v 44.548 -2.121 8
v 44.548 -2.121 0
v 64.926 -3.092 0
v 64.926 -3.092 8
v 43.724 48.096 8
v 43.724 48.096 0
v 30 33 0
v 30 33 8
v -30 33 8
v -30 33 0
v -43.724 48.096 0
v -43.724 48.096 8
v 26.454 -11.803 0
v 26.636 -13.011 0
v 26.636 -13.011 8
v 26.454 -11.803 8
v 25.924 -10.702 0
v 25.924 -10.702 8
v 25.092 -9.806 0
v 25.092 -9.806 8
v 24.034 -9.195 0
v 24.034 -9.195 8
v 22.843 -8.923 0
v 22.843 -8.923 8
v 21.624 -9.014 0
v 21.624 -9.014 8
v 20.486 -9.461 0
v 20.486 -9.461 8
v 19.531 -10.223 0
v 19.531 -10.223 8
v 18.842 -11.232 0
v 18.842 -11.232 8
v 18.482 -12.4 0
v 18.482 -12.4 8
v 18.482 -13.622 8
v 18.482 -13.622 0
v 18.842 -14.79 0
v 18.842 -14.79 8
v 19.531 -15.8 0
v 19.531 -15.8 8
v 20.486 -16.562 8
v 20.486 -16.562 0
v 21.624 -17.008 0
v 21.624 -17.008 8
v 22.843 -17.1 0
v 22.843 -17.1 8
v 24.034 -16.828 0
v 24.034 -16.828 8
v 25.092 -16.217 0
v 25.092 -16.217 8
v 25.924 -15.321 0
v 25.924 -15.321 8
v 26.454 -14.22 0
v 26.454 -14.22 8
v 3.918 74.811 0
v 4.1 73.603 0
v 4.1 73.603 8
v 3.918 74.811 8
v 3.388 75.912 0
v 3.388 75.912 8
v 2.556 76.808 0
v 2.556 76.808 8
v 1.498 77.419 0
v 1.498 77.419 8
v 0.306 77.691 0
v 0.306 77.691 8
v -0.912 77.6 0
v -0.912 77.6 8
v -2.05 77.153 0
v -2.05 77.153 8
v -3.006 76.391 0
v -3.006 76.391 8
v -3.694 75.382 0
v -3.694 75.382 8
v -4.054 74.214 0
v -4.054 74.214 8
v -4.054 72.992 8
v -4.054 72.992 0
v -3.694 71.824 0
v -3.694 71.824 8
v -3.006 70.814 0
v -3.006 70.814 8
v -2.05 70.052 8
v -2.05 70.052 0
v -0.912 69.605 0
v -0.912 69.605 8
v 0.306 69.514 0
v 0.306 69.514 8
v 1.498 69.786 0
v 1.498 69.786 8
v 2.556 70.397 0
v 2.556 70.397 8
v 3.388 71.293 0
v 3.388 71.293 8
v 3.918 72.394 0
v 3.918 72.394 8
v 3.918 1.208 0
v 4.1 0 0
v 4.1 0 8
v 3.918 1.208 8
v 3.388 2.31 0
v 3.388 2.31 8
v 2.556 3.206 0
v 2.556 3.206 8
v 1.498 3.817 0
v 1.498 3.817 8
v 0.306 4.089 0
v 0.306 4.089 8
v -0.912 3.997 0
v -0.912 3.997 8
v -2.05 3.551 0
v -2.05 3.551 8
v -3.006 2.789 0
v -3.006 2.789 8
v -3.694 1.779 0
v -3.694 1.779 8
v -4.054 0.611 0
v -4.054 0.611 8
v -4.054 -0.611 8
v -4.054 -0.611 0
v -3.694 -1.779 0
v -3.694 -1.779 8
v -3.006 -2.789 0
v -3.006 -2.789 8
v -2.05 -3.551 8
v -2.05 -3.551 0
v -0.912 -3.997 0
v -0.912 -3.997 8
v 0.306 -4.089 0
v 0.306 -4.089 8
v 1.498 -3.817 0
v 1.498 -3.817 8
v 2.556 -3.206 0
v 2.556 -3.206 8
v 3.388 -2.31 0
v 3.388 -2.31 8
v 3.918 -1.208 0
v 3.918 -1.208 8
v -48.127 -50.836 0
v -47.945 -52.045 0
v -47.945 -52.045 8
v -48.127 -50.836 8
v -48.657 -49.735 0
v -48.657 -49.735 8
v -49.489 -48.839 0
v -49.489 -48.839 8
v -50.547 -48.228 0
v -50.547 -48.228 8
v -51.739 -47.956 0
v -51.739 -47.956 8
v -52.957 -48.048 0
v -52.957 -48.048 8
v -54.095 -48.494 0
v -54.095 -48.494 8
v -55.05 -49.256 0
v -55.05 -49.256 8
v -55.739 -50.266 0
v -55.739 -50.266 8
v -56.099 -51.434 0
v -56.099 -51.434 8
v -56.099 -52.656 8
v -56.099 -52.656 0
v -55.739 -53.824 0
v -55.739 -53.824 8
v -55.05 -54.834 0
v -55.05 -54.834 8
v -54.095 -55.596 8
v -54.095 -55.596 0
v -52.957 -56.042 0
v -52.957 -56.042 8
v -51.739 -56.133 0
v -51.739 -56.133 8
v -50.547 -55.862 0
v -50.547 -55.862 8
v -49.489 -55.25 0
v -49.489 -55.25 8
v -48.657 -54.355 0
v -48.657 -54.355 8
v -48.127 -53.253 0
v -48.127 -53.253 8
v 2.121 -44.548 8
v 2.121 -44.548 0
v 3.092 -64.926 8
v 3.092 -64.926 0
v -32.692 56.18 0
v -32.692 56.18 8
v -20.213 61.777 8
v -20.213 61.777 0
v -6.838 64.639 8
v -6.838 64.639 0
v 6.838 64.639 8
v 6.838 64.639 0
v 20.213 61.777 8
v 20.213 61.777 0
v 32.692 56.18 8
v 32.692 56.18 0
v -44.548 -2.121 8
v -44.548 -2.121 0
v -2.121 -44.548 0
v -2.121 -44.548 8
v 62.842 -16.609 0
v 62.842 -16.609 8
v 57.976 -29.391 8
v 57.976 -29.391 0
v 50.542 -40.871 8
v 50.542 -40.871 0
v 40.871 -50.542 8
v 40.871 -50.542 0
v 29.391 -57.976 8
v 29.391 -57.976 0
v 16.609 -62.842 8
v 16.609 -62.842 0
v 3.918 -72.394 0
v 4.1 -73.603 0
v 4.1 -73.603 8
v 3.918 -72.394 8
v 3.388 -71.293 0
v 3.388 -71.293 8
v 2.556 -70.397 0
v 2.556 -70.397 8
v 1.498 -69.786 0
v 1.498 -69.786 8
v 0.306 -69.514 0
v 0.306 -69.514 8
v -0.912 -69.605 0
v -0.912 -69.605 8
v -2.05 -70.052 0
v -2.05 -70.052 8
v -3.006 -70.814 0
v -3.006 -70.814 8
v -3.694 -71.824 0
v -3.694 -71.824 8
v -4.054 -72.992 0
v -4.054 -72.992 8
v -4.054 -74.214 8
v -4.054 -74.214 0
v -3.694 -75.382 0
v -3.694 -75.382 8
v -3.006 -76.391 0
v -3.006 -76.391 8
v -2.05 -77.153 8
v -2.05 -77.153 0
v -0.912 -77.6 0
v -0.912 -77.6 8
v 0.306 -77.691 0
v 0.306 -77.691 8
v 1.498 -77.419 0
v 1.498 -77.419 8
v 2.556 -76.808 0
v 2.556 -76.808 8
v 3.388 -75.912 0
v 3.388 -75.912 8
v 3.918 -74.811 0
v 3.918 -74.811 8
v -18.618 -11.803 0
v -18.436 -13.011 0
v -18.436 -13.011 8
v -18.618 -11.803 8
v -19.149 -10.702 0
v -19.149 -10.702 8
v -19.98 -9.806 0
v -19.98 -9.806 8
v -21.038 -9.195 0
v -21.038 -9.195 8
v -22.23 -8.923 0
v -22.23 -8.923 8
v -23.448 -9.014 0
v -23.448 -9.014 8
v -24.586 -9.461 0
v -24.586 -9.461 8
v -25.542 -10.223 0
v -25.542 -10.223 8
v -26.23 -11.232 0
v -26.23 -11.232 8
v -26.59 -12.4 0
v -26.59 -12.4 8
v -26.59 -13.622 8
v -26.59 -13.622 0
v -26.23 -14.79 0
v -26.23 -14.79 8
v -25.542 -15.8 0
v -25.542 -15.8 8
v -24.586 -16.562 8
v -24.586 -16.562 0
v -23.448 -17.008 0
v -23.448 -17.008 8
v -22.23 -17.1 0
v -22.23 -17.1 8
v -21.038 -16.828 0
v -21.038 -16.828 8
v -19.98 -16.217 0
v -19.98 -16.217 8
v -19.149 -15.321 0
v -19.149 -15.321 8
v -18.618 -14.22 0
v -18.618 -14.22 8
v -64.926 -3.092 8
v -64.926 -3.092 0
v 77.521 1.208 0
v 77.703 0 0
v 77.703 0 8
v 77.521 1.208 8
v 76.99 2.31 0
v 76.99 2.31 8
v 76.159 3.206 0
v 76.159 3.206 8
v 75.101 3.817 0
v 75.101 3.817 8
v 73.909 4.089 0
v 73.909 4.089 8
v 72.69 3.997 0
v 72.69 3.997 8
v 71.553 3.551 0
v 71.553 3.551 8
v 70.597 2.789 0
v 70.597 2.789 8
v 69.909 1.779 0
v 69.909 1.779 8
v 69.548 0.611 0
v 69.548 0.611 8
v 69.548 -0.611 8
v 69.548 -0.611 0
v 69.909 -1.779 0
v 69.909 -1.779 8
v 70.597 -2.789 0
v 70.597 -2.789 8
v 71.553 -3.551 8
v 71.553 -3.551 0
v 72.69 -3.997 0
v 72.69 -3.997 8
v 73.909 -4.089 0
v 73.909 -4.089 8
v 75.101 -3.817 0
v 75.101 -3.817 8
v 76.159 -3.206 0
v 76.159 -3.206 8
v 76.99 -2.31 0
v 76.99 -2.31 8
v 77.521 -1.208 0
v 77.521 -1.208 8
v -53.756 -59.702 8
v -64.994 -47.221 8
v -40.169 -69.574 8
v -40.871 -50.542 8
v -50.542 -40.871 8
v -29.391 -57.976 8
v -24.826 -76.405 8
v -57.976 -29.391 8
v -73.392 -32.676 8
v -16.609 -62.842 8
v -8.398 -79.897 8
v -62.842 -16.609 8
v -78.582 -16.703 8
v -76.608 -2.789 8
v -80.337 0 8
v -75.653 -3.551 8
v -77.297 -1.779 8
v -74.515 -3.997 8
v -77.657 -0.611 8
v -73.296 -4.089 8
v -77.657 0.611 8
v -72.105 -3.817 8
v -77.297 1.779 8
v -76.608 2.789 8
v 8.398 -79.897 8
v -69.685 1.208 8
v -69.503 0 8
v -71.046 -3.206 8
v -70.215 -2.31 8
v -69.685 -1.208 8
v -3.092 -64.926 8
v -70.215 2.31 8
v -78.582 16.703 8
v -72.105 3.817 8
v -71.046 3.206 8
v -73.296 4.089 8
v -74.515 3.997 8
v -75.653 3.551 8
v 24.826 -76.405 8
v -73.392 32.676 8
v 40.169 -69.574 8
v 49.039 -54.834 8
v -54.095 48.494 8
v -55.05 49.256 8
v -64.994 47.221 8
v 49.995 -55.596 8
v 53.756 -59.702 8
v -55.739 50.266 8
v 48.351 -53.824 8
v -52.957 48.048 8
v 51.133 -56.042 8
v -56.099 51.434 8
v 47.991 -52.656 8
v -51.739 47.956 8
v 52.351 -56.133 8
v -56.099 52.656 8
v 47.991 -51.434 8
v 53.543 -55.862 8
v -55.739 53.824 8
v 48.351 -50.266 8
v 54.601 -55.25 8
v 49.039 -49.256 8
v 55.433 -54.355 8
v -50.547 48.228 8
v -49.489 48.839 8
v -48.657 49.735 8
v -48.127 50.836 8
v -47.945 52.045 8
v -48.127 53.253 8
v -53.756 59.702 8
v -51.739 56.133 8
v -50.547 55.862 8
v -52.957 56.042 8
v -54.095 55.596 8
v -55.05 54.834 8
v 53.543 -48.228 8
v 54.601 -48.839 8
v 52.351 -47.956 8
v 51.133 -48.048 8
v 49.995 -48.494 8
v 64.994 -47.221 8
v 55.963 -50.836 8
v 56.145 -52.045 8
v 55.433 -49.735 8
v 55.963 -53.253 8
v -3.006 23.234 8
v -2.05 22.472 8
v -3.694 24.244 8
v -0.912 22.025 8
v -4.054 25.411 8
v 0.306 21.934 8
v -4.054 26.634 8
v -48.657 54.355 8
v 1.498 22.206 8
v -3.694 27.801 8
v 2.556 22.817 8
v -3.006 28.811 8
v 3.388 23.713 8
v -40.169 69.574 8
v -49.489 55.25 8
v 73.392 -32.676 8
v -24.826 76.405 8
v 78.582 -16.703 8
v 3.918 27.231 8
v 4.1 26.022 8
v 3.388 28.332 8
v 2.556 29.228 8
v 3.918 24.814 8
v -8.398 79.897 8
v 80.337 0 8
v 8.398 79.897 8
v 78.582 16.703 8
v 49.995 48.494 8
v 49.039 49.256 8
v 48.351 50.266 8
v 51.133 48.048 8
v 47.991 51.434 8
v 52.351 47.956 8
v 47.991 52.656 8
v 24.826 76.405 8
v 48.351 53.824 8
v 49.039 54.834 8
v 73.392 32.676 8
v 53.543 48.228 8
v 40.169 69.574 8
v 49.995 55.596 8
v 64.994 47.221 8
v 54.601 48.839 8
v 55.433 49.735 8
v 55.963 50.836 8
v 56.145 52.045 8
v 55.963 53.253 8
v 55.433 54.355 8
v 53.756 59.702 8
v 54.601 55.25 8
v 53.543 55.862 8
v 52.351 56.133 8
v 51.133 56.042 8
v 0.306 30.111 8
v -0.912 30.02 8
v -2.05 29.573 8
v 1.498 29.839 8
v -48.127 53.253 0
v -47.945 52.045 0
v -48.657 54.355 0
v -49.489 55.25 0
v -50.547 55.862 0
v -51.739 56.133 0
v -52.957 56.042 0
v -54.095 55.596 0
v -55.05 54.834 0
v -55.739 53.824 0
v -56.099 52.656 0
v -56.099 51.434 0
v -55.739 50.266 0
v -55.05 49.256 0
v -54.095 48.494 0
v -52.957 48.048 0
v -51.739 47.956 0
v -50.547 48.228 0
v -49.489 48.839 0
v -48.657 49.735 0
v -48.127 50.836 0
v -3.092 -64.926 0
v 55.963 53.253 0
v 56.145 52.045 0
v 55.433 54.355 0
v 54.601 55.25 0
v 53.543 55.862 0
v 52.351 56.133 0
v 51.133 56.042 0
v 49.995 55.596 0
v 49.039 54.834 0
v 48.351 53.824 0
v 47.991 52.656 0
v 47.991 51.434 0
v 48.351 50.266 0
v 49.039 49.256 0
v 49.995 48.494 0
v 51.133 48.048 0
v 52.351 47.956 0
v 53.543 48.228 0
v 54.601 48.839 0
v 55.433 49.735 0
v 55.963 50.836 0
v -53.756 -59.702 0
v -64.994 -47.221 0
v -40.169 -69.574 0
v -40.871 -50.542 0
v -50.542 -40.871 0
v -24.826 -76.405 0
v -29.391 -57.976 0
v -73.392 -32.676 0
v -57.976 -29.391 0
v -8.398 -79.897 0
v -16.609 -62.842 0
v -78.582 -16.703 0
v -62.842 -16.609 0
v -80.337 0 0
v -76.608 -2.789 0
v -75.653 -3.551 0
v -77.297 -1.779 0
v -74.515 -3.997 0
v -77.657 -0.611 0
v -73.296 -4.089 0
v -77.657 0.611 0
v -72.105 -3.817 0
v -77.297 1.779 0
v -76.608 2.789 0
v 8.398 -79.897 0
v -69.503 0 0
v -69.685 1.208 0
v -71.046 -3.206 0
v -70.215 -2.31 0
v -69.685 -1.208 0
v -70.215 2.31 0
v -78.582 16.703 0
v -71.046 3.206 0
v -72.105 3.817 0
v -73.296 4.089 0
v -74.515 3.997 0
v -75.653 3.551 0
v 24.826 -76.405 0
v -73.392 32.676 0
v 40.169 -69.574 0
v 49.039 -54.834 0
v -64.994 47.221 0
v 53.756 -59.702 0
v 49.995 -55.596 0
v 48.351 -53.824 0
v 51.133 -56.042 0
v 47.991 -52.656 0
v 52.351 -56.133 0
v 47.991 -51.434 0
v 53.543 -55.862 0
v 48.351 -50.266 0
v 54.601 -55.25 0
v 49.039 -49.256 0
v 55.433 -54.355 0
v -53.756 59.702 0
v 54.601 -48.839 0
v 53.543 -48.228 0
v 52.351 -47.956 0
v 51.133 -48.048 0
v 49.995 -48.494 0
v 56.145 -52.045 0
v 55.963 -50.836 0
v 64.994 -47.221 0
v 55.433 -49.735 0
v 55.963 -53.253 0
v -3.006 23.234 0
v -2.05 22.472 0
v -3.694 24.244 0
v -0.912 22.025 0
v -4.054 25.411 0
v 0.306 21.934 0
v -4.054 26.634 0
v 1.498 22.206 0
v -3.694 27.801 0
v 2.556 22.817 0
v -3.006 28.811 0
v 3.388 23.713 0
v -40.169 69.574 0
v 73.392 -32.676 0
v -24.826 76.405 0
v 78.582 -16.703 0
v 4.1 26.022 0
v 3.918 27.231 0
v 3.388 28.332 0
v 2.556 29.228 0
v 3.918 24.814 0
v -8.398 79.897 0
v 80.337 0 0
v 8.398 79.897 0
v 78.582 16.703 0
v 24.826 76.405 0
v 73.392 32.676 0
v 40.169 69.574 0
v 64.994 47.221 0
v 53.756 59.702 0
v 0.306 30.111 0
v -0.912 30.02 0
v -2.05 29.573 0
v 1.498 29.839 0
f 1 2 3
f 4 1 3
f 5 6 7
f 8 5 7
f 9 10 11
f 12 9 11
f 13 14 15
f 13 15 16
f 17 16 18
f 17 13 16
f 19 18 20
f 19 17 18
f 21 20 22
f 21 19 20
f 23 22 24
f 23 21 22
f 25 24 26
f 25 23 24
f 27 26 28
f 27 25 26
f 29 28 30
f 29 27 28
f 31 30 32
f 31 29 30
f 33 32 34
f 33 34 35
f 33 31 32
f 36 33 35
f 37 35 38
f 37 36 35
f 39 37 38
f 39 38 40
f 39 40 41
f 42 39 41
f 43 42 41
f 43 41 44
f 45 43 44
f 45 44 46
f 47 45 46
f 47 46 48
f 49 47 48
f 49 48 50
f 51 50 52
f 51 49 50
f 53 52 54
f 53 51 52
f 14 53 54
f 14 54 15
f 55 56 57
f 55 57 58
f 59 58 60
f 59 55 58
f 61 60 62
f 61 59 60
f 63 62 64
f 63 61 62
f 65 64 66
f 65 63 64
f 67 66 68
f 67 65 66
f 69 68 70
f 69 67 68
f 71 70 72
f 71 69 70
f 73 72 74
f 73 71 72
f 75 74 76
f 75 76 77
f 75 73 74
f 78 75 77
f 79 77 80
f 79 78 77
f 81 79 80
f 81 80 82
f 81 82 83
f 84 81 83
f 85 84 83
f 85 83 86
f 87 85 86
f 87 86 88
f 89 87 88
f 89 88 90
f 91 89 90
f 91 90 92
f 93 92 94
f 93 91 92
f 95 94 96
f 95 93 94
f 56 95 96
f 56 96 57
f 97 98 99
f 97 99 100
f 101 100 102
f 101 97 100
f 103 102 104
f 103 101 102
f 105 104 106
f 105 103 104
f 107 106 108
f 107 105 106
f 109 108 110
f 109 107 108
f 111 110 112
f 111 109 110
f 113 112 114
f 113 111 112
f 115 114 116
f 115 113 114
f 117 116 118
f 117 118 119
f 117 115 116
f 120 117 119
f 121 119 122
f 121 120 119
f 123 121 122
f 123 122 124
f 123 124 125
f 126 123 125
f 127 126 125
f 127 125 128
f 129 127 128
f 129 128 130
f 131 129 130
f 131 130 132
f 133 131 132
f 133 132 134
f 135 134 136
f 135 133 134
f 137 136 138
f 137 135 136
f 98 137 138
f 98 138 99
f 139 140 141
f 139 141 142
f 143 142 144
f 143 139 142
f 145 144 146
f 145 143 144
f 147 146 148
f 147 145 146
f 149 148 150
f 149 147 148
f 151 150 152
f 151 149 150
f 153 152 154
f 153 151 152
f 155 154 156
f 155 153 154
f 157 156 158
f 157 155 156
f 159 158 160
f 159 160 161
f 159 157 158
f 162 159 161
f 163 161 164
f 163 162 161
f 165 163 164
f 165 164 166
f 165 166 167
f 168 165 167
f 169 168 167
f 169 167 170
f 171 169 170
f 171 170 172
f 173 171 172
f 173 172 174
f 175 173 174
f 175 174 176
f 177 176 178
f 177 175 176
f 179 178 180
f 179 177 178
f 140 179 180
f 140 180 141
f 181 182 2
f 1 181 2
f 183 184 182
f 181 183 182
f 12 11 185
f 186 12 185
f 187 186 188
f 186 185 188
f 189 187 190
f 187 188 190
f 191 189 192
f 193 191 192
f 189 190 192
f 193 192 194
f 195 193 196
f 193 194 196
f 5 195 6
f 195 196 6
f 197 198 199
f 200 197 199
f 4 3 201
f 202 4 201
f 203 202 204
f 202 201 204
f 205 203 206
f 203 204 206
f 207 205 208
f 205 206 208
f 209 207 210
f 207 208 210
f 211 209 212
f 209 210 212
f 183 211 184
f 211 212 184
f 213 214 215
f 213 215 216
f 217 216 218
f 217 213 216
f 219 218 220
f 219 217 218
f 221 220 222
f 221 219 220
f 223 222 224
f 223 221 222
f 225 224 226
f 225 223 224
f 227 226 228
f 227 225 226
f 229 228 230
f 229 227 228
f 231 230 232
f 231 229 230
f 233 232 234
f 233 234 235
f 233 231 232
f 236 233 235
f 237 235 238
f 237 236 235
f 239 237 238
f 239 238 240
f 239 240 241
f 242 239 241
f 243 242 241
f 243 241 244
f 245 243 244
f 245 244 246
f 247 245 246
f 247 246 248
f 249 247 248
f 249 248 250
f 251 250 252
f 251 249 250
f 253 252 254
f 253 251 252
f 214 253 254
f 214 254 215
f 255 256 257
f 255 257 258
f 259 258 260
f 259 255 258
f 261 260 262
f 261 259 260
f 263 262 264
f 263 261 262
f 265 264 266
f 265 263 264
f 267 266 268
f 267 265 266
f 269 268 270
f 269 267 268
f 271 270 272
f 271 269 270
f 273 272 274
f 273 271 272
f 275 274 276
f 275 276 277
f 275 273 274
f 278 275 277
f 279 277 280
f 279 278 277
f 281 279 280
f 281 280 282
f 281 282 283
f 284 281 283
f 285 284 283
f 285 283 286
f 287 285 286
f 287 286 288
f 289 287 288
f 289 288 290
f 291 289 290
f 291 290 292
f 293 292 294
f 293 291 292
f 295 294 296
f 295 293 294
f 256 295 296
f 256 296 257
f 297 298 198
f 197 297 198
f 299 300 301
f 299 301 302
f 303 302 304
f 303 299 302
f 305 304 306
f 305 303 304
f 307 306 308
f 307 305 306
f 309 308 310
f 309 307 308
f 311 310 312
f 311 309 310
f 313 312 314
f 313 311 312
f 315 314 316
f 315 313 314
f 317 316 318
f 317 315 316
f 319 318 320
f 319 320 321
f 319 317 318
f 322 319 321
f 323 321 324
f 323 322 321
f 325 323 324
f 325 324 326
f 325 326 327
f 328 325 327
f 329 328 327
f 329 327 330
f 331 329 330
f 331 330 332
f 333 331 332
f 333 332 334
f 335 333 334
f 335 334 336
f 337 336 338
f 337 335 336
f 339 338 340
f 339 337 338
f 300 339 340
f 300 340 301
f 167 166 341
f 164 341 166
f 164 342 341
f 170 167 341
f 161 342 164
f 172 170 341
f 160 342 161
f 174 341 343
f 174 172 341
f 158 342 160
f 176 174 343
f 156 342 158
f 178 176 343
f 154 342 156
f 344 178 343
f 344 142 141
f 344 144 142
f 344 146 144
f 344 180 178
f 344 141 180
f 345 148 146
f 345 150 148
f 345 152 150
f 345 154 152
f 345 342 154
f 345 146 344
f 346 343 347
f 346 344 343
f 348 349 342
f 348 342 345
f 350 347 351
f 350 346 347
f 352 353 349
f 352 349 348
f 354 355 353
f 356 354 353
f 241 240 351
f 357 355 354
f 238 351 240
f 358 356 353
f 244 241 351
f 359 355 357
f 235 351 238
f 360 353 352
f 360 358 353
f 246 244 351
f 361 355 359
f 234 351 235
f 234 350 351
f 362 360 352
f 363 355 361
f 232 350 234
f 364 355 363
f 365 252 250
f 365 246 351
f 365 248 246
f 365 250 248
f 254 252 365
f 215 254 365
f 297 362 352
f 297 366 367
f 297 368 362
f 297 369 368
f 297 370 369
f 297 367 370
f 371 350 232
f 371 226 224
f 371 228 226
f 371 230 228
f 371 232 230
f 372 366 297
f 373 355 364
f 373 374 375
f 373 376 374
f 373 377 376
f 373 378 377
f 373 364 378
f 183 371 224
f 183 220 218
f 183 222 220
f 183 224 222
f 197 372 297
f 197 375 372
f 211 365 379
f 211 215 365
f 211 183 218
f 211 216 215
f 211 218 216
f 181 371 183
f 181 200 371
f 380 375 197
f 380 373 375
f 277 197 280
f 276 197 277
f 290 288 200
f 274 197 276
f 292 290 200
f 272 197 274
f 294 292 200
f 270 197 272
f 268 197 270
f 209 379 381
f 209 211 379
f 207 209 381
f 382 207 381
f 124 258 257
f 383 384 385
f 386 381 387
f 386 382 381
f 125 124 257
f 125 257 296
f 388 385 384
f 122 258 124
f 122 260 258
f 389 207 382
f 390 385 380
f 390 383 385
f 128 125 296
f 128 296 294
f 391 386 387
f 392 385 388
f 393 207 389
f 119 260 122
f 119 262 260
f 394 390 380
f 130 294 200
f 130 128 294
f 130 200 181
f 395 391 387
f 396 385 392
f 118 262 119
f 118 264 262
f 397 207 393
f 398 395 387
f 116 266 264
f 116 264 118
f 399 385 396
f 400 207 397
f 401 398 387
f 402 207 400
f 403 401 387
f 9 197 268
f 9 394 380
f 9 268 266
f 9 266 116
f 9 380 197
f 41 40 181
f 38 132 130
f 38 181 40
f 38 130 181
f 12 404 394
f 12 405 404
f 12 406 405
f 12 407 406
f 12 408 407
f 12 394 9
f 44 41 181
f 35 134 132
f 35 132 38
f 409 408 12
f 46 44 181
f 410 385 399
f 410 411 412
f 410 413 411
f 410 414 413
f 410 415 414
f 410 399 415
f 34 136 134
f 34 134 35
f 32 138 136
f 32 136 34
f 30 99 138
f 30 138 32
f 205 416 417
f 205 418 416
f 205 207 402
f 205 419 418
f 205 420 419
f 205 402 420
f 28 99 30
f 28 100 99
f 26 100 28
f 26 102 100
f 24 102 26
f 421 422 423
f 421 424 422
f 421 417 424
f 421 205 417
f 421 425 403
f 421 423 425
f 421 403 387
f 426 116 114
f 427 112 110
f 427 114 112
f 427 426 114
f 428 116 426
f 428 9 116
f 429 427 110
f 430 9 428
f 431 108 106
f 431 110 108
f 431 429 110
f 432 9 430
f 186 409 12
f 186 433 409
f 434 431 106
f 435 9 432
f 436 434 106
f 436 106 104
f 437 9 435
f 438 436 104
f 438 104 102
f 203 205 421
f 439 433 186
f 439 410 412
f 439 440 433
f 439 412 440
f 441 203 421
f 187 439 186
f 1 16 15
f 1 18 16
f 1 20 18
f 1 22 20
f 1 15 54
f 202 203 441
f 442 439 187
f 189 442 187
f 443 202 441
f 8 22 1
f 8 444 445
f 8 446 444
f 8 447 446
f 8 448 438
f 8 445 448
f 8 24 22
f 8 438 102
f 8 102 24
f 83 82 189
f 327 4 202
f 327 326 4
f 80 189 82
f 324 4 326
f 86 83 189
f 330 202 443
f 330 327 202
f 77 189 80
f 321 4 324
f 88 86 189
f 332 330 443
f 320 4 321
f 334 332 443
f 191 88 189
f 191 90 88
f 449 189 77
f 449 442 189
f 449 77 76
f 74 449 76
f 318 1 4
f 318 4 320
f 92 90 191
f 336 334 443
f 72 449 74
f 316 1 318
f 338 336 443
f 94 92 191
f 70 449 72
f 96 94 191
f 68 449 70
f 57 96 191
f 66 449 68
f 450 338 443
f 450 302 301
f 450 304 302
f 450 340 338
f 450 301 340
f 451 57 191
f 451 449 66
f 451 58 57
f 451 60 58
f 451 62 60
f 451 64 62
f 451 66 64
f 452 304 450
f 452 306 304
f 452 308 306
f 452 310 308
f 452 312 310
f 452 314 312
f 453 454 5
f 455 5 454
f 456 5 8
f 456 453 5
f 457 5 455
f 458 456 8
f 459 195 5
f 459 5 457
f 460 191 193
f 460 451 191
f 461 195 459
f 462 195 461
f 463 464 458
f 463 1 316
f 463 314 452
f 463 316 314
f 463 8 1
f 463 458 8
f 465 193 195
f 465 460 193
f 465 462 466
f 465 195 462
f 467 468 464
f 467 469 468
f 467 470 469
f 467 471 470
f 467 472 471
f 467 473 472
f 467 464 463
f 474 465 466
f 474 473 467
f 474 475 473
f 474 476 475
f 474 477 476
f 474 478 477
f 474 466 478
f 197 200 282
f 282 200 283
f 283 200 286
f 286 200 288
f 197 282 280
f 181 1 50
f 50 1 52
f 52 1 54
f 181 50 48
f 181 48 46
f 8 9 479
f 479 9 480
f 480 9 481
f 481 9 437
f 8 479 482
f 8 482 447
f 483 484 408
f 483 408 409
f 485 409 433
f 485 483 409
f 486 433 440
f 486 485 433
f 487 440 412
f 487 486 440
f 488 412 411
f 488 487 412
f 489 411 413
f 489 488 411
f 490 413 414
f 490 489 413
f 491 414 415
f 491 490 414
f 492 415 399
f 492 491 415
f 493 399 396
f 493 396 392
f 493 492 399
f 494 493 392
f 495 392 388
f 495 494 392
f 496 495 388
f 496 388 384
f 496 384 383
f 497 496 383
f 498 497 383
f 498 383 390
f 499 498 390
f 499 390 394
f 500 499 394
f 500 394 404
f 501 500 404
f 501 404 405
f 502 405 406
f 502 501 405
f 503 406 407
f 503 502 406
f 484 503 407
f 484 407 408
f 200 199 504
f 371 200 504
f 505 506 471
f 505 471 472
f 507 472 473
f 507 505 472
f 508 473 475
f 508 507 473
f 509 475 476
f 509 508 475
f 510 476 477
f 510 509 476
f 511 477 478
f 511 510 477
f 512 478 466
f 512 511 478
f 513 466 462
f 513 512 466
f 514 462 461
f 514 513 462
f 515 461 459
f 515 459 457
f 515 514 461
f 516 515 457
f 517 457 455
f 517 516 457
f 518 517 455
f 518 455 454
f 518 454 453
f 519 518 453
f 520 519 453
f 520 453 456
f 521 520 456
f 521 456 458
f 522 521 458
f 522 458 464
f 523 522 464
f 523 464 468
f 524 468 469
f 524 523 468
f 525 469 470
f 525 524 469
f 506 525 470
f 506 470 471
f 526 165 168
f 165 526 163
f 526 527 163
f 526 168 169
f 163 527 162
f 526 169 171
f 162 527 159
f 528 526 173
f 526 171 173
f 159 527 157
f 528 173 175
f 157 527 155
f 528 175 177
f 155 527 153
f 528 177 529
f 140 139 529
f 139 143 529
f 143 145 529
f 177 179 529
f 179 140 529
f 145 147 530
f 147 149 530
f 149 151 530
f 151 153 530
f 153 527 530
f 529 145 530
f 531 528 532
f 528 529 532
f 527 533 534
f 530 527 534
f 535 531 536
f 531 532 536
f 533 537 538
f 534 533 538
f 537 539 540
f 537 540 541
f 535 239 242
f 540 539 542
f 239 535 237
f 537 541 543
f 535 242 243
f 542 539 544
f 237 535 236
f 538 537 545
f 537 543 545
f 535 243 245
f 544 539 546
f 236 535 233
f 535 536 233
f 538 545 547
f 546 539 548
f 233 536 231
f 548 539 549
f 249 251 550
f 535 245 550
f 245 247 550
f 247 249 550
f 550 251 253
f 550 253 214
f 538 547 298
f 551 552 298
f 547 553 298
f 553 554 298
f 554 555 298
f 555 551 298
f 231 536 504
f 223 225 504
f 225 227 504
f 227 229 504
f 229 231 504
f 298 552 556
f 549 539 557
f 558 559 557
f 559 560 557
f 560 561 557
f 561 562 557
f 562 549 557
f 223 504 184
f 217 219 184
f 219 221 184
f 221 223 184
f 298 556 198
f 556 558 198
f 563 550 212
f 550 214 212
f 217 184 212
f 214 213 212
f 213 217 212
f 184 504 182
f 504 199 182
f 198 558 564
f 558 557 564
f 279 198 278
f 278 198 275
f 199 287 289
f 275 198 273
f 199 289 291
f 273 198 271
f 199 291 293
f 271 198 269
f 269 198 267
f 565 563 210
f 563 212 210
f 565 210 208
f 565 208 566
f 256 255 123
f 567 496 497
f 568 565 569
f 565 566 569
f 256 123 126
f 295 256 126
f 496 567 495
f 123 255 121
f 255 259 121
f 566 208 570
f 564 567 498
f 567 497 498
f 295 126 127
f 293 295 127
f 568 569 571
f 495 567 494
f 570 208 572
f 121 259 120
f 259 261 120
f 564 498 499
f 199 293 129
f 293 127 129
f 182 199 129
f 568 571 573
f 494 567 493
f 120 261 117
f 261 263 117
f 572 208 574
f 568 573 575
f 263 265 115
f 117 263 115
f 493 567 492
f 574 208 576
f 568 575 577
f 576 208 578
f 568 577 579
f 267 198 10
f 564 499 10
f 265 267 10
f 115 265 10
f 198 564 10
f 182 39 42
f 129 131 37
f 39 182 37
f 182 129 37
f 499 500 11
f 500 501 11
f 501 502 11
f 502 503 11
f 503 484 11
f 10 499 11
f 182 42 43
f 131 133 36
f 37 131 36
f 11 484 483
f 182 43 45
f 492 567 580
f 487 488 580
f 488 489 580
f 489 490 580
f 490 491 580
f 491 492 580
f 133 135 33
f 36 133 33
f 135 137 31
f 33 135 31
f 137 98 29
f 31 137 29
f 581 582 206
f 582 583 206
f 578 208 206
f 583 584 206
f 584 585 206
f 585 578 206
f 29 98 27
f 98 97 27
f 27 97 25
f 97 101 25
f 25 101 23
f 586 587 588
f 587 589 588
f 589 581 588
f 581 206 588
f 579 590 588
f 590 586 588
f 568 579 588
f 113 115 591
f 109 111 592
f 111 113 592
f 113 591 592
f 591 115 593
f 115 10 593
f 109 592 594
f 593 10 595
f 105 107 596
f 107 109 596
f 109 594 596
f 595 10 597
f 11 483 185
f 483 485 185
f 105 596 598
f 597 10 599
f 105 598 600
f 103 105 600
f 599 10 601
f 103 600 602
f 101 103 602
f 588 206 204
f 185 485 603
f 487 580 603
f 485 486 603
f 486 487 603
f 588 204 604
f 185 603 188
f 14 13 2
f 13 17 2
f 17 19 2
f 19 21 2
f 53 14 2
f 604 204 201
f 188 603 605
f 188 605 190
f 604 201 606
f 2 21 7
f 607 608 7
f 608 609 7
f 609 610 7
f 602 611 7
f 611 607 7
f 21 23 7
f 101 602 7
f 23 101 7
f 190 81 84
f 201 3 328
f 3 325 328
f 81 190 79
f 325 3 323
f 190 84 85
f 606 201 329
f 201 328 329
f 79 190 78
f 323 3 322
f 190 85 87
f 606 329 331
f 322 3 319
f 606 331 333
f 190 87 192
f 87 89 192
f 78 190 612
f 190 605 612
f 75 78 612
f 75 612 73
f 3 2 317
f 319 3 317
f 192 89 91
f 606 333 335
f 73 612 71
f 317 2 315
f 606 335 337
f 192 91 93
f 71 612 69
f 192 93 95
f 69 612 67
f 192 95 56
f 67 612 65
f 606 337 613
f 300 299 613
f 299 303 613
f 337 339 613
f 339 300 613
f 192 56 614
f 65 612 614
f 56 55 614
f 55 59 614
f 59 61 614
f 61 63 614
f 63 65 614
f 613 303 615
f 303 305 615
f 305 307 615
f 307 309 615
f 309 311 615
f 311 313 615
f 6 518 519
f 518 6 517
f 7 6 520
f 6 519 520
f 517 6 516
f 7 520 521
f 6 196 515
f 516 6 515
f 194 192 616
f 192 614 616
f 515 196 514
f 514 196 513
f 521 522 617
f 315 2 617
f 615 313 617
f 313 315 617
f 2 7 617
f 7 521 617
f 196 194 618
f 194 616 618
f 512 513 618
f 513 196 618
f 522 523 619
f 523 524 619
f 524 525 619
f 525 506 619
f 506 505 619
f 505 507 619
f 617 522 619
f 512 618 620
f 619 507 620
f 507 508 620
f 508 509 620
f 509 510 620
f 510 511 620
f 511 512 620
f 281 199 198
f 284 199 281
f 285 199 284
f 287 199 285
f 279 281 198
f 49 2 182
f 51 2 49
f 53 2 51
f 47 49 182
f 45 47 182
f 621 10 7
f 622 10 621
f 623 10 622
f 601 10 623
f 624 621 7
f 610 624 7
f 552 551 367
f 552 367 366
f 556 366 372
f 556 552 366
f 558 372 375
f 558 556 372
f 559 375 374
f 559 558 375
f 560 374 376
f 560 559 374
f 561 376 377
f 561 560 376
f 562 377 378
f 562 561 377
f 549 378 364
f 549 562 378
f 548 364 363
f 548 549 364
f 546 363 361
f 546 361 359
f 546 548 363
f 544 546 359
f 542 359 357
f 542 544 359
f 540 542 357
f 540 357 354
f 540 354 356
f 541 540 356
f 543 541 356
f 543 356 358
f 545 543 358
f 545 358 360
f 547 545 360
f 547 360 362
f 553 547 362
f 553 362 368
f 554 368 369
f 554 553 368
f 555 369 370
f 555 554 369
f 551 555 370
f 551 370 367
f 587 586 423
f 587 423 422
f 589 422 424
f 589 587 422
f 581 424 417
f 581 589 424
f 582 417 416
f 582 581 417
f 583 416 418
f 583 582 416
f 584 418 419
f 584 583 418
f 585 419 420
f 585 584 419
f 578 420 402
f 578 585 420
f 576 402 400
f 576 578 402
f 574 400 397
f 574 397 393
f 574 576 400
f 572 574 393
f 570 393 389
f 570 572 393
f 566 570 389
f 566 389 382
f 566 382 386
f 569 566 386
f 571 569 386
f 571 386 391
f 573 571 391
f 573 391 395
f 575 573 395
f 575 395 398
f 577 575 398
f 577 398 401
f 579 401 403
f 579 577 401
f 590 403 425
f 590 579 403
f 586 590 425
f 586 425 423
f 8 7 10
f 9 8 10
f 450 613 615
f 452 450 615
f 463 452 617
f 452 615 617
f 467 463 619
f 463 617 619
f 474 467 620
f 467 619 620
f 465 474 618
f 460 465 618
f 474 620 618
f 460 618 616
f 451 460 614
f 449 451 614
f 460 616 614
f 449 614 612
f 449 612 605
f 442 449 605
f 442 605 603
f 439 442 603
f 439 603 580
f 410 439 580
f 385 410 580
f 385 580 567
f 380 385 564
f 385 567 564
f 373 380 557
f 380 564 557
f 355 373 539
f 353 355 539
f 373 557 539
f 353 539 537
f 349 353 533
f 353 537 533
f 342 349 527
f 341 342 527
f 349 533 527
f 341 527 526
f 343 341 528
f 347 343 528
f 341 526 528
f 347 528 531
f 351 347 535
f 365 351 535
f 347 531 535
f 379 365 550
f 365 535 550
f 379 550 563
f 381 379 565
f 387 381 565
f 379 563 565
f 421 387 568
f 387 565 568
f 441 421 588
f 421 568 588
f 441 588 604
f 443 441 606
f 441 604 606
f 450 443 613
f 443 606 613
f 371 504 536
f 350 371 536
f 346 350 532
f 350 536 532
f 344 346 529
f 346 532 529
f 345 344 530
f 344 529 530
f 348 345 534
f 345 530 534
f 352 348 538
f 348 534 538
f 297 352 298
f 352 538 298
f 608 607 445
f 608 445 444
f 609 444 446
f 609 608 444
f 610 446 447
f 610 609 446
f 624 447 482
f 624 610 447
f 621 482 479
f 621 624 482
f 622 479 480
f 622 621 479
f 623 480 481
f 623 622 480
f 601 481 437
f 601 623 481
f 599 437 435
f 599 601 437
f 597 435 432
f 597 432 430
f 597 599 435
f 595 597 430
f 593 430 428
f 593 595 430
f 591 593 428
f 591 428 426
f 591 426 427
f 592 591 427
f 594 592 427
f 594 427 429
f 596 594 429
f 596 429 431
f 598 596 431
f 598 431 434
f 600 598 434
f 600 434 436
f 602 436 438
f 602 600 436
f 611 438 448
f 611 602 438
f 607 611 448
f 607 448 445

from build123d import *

# Parameters (mm, degrees)
SKETCH_1_R      = 80.33713036
SKETCH_1_R_2    = 4.1
EXTRUDE_1_DEPTH = 8


with BuildPart() as part:
    # 草图1 → 凸台-拉伸1 (new body)
    with BuildSketch(Plane.XY):
        Circle(SKETCH_1_R)
        with Locations((0, 73.60266962)):
            Circle(SKETCH_1_R_2, mode=Mode.SUBTRACT)
        with Locations((-52.044946802, 52.044946802)):
            Circle(SKETCH_1_R_2, mode=Mode.SUBTRACT)
        with Locations((-73.60266962, 0)):
            Circle(SKETCH_1_R_2, mode=Mode.SUBTRACT)
        with Locations((-52.044946802, -52.044946802)):
            Circle(SKETCH_1_R_2, mode=Mode.SUBTRACT)
        with Locations((0, -73.60266962)):
            Circle(SKETCH_1_R_2, mode=Mode.SUBTRACT)
        with Locations((52.044946802, -52.044946802)):
            Circle(SKETCH_1_R_2, mode=Mode.SUBTRACT)
        with Locations((73.60266962, 0)):
            Circle(SKETCH_1_R_2, mode=Mode.SUBTRACT)
        with Locations((52.044946802, 52.044946802)):
            Circle(SKETCH_1_R_2, mode=Mode.SUBTRACT)
        with Locations((0, 26.022473401)):
            Circle(SKETCH_1_R_2, mode=Mode.SUBTRACT)
        with Locations((22.536123034, -13.0112367)):
            Circle(SKETCH_1_R_2, mode=Mode.SUBTRACT)
        with Locations((-22.536123034, -13.0112367)):
            Circle(SKETCH_1_R_2, mode=Mode.SUBTRACT)
        Circle(SKETCH_1_R_2, mode=Mode.SUBTRACT)
        with BuildLine():
            Line((43.72373161, 48.096104771), (30, 33))
            Line((30, 33), (-30, 33))
            Line((-30, 33), (-43.72373161, 48.096104771))
            ThreePointArc((-43.72373161, 48.096104771), (0, 65), (43.72373161, 48.096104771))
        make_face(mode=Mode.SUBTRACT)
        with BuildLine():
            Line((-64.926428952, -3.091734712), (-44.547727215, -2.121320344))
            Line((-44.547727215, -2.121320344), (-2.121320344, -44.547727215))
            Line((-2.121320344, -44.547727215), (-3.091734712, -64.926428952))
            ThreePointArc((-3.091734712, -64.926428952), (-45.961940777, -45.961940777), (-64.926428952, -3.091734712))
        make_face(mode=Mode.SUBTRACT)
        with BuildLine():
            Line((3.091734712, -64.926428952), (2.121320344, -44.547727215))
            Line((2.121320344, -44.547727215), (44.547727215, -2.121320344))
            Line((44.547727215, -2.121320344), (64.926428952, -3.091734712))
            ThreePointArc((64.926428952, -3.091734712), (45.961940777, -45.961940777), (3.091734712, -64.926428952))
        make_face(mode=Mode.SUBTRACT)
    extrude(amount=EXTRUDE_1_DEPTH)


solid = part.part
